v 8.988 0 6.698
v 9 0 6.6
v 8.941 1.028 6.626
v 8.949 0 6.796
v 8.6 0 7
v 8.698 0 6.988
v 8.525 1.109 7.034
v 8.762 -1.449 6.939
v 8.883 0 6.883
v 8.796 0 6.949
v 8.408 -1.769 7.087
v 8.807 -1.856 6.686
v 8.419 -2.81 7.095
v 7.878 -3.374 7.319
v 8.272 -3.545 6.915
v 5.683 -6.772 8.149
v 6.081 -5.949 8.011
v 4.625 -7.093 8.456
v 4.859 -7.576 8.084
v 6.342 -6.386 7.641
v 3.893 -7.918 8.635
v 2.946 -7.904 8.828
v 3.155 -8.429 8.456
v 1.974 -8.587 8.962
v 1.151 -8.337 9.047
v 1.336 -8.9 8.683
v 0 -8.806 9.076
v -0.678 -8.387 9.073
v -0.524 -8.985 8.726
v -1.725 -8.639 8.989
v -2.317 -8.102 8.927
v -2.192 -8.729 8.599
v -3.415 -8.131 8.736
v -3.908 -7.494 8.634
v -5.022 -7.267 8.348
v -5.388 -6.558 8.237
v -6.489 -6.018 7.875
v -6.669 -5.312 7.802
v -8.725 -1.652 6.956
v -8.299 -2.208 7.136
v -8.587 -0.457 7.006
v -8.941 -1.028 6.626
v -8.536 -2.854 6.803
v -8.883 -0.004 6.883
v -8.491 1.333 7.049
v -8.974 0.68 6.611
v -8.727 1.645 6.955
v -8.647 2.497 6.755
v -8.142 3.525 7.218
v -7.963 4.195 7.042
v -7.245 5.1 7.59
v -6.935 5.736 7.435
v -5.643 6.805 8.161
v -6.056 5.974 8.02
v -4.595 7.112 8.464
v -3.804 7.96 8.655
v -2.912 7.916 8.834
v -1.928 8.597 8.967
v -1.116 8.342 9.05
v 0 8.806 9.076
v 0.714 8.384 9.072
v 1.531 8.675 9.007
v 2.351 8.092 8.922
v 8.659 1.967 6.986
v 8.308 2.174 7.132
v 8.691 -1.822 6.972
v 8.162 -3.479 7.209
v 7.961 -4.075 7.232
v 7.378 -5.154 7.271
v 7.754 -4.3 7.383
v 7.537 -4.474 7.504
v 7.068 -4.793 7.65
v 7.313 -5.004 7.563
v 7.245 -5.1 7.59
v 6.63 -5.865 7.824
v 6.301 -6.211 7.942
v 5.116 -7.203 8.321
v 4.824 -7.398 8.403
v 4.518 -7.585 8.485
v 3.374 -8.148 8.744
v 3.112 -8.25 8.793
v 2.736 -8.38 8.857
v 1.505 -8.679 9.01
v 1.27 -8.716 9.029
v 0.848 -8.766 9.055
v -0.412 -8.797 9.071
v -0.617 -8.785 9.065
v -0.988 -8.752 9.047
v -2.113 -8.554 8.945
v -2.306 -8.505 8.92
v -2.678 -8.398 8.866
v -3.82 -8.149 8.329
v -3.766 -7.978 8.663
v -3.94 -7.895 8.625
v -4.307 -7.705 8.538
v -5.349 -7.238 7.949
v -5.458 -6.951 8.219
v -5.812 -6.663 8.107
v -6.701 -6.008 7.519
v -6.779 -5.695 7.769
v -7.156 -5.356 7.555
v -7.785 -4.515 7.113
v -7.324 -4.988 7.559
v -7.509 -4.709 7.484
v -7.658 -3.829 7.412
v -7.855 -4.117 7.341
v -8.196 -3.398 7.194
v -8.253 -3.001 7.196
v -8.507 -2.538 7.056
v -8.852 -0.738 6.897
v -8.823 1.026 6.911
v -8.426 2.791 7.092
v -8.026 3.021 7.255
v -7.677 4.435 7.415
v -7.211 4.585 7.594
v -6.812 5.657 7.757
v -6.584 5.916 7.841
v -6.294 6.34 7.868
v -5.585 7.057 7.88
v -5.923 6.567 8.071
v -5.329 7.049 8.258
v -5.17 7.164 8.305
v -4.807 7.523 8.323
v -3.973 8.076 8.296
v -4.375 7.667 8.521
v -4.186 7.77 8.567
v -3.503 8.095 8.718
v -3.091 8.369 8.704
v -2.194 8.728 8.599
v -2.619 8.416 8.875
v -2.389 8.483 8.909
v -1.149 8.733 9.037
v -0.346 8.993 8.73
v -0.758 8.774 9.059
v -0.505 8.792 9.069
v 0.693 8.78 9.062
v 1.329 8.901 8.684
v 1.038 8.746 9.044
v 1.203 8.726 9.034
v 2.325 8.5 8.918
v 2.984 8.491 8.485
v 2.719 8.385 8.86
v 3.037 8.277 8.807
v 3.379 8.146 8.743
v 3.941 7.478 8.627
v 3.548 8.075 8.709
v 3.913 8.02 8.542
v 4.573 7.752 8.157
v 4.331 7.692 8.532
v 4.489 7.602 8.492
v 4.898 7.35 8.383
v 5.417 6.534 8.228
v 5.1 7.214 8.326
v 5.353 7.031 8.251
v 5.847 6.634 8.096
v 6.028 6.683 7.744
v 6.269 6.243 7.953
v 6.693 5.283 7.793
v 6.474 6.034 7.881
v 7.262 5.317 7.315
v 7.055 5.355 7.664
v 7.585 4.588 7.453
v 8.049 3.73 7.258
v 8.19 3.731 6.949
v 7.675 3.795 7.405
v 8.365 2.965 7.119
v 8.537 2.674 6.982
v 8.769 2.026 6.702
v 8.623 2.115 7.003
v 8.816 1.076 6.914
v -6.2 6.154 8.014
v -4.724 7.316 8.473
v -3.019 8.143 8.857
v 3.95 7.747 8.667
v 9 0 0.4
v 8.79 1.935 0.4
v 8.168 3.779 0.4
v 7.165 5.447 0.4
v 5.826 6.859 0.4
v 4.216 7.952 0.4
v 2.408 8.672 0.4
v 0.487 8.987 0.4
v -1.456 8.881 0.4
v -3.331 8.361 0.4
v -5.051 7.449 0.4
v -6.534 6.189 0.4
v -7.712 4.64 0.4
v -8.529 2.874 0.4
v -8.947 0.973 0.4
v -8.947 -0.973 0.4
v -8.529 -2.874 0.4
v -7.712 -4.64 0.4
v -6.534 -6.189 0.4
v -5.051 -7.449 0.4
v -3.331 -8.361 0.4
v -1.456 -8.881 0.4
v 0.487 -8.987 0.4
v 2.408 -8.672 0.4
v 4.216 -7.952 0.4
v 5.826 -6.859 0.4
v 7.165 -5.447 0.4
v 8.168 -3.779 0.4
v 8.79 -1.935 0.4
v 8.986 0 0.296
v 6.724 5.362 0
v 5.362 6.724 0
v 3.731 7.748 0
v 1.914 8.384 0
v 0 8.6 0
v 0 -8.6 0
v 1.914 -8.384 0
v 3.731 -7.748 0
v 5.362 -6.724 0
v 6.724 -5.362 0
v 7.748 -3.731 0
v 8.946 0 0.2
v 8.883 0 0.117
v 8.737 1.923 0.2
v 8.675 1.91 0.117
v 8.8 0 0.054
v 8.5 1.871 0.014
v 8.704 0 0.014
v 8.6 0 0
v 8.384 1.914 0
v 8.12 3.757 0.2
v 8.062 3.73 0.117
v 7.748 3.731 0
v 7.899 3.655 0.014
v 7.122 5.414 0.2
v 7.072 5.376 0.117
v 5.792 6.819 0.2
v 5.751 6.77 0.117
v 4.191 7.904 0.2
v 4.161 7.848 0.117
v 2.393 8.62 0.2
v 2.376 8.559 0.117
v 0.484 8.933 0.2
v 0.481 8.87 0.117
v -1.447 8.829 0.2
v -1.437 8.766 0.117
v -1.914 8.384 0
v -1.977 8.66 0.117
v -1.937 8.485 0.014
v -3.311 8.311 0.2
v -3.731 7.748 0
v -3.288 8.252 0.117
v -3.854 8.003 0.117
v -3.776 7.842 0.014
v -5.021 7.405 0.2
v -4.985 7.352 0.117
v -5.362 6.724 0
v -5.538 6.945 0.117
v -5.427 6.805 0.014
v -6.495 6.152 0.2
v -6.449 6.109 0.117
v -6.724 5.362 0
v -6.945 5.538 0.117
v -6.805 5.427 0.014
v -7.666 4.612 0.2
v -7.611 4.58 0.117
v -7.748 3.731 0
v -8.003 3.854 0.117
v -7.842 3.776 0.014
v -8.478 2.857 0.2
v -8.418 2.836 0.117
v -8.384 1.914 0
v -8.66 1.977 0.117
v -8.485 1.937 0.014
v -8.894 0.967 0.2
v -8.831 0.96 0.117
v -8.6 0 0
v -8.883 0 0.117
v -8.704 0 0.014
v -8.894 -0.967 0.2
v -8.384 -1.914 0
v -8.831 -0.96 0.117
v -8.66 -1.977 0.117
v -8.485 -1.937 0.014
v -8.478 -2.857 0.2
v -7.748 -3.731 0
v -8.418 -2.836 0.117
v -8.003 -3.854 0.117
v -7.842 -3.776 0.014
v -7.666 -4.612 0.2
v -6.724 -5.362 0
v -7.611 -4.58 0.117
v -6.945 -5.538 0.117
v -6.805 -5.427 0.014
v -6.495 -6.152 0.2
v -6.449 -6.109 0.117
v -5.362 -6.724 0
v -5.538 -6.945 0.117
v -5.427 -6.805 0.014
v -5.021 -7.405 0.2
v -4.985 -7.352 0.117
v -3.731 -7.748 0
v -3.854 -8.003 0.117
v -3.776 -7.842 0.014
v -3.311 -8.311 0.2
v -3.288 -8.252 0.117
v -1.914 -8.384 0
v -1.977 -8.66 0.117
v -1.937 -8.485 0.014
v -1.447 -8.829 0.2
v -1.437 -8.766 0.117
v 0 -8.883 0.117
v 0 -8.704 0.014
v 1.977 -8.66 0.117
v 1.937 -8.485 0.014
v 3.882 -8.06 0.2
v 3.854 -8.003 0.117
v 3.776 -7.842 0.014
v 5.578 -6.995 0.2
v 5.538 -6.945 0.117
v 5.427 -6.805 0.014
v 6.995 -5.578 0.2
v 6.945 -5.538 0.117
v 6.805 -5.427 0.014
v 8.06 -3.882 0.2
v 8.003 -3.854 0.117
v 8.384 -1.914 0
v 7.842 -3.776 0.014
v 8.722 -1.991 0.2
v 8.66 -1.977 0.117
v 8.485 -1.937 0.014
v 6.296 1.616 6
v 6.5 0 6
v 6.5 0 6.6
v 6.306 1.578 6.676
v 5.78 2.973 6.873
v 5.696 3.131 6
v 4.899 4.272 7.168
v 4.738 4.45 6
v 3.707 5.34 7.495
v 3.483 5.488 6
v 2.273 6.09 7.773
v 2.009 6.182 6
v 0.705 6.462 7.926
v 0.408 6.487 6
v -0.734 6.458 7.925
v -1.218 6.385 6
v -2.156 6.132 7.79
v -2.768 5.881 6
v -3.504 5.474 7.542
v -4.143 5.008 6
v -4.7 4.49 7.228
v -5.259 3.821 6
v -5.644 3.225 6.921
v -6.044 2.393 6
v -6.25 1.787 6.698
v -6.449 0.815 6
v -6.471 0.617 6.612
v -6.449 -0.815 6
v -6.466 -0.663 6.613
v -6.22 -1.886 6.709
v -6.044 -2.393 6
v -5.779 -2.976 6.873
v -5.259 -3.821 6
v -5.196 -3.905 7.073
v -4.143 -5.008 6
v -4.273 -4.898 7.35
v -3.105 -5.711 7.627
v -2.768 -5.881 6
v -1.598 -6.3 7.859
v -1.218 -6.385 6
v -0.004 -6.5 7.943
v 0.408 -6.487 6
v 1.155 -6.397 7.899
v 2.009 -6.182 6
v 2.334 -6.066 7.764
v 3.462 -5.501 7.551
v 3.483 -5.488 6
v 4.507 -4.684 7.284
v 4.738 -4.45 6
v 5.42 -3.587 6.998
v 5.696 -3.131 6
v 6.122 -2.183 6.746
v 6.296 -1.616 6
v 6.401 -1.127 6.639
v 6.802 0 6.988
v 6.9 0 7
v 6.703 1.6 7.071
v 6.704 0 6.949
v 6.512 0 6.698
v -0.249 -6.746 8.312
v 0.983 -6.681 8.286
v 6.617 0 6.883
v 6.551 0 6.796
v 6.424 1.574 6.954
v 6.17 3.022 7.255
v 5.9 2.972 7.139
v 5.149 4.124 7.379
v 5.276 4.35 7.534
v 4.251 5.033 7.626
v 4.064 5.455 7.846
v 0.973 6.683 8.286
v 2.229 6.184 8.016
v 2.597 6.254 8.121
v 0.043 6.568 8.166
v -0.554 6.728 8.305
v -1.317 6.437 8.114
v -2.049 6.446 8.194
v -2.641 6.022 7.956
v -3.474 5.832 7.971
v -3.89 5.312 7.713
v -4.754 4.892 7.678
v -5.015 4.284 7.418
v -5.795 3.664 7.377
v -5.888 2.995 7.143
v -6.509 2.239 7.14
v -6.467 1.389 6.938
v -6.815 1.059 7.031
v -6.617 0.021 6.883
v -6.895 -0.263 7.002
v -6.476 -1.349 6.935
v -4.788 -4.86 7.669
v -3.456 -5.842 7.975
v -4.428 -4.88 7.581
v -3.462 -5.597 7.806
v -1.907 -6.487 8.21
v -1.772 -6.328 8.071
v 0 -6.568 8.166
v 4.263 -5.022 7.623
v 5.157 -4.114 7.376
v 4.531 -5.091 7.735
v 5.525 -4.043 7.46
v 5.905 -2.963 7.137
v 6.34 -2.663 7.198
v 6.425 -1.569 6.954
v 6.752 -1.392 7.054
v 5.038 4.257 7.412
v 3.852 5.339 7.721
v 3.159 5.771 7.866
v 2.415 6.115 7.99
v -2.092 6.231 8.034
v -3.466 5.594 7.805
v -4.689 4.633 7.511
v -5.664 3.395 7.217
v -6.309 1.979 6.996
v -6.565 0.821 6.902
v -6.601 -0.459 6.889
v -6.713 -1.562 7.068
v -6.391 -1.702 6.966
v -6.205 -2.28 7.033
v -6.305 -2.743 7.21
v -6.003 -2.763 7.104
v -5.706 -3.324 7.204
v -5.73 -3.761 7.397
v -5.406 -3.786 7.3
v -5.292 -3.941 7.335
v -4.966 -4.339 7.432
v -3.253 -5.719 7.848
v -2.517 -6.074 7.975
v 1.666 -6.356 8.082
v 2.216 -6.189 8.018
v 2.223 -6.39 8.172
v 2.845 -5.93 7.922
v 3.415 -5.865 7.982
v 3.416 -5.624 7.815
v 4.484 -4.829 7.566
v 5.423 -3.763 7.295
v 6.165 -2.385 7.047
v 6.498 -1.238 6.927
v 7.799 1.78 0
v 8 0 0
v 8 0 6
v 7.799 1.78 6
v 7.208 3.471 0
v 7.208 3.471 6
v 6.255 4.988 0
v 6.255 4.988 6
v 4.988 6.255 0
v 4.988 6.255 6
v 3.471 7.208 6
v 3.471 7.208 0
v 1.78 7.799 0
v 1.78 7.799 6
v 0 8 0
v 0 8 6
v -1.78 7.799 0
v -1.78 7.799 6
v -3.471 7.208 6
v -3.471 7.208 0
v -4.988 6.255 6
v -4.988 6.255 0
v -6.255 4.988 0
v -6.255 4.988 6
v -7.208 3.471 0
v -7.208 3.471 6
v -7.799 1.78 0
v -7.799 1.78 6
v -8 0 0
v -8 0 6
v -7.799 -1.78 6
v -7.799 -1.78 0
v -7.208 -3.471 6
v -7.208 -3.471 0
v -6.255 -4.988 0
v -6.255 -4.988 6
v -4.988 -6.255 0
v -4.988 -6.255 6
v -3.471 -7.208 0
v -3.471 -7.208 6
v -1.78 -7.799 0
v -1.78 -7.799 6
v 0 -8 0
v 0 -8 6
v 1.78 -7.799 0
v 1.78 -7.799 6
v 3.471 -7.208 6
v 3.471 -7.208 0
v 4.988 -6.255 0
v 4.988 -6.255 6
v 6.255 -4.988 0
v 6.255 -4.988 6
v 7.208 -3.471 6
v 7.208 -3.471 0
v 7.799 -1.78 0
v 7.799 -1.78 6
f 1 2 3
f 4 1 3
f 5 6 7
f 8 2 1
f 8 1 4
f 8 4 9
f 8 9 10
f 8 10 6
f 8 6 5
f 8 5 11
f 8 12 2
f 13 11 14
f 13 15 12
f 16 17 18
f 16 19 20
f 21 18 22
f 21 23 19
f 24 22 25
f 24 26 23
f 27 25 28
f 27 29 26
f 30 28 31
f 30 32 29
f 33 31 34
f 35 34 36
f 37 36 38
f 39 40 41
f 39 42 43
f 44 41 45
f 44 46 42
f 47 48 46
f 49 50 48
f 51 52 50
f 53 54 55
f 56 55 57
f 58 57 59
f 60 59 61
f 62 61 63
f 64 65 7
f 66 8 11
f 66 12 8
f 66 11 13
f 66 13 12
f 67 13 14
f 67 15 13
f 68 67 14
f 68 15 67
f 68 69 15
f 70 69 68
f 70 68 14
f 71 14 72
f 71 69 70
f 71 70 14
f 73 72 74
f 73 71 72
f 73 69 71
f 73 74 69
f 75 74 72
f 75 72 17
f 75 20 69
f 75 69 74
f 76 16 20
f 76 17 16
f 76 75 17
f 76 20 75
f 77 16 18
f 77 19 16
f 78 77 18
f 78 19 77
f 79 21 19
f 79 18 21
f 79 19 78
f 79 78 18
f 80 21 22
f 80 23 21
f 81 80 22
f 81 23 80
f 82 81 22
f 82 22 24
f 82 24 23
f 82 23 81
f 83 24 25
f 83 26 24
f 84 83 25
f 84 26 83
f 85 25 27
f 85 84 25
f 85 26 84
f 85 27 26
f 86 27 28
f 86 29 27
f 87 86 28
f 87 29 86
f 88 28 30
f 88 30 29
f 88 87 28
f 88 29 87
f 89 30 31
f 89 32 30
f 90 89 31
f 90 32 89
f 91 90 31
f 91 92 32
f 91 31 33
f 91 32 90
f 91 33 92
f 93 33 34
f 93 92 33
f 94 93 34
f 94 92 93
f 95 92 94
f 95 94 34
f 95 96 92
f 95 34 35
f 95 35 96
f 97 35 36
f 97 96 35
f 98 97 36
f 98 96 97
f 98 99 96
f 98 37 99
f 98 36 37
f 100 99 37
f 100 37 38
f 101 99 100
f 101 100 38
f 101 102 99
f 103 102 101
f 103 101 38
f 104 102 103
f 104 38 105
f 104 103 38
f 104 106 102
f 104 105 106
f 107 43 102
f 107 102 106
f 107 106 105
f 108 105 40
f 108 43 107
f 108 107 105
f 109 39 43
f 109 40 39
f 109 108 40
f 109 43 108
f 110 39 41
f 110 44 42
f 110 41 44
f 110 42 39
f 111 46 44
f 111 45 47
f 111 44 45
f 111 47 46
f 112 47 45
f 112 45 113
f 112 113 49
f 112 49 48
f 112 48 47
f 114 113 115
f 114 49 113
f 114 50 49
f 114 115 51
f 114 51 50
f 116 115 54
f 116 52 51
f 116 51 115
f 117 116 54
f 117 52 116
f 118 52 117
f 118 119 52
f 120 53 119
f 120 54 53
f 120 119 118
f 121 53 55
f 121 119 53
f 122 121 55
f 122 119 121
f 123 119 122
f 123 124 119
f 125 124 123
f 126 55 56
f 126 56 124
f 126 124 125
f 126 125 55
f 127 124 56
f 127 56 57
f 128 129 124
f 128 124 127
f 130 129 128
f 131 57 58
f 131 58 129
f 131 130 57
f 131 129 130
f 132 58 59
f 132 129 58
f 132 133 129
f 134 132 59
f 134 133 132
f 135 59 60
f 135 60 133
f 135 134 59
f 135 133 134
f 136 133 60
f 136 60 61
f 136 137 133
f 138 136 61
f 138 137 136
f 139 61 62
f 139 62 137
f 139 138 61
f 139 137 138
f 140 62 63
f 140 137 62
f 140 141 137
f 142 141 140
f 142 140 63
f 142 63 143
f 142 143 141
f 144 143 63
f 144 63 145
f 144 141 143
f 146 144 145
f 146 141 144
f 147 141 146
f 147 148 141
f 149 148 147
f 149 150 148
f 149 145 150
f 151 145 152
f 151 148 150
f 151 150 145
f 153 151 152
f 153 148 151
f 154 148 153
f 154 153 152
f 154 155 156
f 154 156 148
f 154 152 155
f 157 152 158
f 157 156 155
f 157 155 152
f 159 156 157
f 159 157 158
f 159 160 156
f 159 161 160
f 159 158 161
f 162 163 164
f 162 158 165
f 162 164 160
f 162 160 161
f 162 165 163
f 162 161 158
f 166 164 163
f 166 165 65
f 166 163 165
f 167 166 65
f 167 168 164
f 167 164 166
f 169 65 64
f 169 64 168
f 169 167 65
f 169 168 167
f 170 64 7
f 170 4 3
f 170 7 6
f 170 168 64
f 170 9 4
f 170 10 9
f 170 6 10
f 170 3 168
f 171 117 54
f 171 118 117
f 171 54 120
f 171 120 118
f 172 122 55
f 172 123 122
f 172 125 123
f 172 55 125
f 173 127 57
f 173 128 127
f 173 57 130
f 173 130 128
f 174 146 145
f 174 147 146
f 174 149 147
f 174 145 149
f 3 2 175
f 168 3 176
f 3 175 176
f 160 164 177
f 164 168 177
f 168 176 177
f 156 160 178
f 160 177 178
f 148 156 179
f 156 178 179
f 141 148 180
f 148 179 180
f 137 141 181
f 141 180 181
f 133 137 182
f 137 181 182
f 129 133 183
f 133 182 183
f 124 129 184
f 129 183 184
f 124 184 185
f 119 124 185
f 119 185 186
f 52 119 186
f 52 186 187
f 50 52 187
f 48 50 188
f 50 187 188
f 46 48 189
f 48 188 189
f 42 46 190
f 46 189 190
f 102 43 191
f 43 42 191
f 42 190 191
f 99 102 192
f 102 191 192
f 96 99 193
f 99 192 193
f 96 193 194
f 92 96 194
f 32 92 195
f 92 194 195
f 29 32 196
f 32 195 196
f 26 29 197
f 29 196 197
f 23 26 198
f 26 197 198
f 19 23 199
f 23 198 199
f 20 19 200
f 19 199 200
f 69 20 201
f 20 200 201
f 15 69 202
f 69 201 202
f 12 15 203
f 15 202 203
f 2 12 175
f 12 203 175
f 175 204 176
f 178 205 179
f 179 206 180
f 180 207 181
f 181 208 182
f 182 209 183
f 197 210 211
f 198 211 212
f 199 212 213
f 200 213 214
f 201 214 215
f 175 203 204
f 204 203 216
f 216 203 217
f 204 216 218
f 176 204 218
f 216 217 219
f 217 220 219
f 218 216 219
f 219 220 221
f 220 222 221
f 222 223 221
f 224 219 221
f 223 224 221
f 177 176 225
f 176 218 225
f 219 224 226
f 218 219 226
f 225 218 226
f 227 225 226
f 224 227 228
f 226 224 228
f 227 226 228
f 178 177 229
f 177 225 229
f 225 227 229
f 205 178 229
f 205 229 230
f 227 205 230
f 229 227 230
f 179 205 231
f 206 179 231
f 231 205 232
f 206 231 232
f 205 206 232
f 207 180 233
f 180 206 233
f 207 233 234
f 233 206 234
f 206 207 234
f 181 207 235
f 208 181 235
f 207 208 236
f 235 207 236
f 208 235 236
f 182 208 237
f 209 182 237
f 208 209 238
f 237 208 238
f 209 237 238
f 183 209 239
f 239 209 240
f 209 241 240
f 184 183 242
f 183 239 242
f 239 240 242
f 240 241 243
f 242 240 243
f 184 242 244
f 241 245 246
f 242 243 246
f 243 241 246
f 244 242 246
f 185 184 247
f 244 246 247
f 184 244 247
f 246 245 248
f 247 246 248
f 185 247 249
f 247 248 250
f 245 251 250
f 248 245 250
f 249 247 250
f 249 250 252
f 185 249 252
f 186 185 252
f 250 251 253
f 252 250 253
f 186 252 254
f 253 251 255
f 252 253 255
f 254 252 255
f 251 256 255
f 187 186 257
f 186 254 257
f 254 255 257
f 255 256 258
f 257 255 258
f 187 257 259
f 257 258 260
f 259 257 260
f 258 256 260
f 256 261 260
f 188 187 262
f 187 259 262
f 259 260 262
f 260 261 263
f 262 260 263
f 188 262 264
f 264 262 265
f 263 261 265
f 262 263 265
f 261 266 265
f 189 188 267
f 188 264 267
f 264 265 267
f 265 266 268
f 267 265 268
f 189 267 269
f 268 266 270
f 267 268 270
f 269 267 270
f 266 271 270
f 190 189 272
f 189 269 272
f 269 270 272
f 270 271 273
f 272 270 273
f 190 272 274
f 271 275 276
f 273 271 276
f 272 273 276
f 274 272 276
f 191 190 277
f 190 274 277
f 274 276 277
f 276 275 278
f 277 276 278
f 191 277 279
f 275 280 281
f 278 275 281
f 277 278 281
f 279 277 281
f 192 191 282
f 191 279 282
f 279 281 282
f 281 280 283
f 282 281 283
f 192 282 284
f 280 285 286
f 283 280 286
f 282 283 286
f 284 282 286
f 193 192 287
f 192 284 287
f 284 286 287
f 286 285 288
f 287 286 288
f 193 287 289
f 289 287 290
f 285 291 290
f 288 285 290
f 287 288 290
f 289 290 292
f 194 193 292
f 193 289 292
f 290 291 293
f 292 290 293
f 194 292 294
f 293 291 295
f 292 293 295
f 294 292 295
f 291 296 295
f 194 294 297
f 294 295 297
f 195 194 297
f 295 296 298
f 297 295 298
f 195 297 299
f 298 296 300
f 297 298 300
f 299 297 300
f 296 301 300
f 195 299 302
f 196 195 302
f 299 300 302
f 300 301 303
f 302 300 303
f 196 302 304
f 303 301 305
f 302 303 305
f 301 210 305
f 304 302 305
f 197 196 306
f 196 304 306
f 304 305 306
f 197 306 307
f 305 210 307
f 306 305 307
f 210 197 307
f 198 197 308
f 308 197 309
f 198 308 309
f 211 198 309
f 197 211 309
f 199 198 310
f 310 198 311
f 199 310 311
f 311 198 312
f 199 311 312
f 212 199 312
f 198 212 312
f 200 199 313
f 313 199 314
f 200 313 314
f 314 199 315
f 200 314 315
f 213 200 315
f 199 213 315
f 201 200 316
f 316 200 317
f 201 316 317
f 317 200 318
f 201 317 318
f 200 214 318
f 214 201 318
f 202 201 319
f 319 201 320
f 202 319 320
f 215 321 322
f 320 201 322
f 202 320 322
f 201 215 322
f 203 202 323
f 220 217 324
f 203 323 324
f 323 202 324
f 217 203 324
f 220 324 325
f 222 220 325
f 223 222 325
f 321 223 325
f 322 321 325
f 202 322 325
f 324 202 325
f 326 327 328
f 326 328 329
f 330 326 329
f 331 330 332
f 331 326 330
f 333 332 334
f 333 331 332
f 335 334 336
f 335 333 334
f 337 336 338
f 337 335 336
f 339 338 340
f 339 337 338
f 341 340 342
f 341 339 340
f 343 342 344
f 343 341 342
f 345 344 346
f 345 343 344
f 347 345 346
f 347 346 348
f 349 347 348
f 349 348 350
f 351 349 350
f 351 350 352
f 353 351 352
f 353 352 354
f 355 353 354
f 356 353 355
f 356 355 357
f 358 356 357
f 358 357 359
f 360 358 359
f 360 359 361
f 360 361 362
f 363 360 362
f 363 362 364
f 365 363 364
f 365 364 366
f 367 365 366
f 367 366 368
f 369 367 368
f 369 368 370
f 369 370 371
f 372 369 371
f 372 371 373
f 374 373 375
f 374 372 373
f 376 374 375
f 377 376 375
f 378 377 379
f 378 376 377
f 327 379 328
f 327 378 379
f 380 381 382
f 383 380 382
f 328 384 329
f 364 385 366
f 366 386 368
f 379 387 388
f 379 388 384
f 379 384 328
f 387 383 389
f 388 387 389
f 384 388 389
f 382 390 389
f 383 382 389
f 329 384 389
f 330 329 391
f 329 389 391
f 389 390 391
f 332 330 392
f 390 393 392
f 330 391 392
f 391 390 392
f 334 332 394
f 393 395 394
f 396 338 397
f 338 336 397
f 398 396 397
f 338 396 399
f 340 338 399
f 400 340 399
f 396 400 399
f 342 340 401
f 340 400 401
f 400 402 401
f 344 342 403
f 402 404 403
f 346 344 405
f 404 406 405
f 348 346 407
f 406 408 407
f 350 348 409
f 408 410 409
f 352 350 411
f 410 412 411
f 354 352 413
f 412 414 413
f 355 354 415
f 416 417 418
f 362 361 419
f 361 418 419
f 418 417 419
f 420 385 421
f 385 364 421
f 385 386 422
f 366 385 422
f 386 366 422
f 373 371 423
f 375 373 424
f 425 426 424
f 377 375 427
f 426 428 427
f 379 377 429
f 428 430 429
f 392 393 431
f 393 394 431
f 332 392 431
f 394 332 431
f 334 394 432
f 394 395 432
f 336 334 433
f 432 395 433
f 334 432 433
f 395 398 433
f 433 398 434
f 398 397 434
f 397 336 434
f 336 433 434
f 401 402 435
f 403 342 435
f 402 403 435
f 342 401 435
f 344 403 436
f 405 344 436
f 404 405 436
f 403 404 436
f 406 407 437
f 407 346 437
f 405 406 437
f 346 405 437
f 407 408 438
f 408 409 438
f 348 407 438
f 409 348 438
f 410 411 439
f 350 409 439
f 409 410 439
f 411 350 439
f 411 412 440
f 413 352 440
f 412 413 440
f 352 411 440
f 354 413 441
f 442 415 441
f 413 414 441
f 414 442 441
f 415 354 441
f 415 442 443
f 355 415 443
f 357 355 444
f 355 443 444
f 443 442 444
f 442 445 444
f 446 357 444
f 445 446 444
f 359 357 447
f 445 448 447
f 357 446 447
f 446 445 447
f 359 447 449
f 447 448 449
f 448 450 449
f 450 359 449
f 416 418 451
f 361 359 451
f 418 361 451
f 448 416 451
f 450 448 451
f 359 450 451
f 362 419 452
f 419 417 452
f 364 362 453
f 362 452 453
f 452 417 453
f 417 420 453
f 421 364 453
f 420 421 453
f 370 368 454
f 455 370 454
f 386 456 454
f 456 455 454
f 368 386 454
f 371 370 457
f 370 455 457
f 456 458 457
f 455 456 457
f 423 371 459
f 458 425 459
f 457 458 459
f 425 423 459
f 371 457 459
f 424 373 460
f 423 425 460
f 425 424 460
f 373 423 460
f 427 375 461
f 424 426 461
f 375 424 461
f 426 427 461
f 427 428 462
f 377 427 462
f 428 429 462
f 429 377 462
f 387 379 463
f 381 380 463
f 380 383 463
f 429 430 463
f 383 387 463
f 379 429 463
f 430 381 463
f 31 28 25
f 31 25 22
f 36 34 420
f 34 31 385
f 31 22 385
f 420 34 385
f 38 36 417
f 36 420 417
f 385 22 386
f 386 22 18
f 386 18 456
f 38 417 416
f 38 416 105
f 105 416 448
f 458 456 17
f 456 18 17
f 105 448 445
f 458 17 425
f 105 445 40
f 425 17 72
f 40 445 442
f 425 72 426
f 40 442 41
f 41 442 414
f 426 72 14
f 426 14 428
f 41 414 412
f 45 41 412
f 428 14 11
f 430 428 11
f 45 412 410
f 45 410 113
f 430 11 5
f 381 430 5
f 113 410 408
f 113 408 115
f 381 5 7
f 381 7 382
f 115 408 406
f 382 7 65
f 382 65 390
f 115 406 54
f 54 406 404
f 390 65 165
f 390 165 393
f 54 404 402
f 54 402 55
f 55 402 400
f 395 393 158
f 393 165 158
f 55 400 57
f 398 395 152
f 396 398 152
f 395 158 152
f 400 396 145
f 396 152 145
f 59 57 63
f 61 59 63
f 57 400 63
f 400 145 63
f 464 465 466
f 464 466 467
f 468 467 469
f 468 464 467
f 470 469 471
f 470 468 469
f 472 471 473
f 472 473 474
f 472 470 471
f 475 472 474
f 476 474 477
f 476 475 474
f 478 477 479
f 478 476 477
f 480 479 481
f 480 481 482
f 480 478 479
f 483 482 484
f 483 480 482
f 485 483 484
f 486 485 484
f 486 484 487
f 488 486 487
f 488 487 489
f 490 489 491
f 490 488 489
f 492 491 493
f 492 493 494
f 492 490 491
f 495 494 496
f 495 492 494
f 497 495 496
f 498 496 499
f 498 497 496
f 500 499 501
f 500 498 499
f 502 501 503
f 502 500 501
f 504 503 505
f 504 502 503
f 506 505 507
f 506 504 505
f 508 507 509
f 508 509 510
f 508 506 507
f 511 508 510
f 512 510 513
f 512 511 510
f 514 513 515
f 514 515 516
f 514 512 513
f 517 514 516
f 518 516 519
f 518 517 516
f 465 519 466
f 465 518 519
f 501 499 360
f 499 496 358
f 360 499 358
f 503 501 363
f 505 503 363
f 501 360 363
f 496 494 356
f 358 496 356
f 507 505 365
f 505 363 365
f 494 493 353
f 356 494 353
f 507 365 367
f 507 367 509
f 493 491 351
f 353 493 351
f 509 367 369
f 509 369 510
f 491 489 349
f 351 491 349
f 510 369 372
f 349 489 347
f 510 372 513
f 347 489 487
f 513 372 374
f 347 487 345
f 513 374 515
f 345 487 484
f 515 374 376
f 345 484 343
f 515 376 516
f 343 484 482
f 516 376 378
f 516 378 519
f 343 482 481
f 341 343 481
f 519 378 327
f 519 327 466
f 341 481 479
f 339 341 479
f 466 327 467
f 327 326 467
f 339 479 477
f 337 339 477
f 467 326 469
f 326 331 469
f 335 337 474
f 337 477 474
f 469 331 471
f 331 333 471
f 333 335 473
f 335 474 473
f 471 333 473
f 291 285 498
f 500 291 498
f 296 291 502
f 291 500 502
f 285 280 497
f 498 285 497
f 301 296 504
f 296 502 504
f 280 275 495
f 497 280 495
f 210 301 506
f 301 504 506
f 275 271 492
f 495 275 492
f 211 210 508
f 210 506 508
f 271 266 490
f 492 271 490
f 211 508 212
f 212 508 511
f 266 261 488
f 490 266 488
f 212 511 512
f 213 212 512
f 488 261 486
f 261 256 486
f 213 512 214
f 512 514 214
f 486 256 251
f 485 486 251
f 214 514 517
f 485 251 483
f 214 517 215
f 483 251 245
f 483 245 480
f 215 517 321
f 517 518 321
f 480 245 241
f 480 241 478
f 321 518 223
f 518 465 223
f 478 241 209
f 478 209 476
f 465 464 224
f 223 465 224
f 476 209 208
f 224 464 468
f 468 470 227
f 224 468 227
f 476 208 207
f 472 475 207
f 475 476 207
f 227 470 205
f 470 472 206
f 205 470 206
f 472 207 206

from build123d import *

# Parameters (mm, degrees)
SKETCH_R        = 9
SKETCH_R_2      = 6.5
PAD_DEPTH       = 10
SKETCH001_R     = 18
POCKET_DEPTH    = 9
SKETCH002_R     = 8
POCKET001_DEPTH = 6
FILLET_R        = 0.4
FILLET001_R     = 0.4


with BuildPart() as part:
    # Sketch → Pad (new body)
    with BuildSketch(Plane.XY):
        Circle(SKETCH_R)
        Circle(SKETCH_R_2, mode=Mode.SUBTRACT)
    extrude(amount=PAD_DEPTH)

    # Sketch001 → Pocket (cut, symmetric)
    with BuildSketch(Plane.YZ):
        with Locations((0, 25)):
            Circle(SKETCH001_R)
    extrude(amount=POCKET_DEPTH, both=True, mode=Mode.SUBTRACT)

    # Sketch002 → Pocket001 (cut)
    with BuildSketch(Plane.XY):
        Circle(SKETCH002_R)
    extrude(amount=POCKET001_DEPTH, mode=Mode.SUBTRACT)

    # Fillet
    fillet_edges = [part.edges().sort_by_distance(p)[0] for p in [
        (0, 9, 9.411543),
        (-6.5, 0, 7),
        (0, -9, 9.411543),
    ]]
    fillet(fillet_edges, radius=FILLET_R)

    # Fillet001
    fillet001_edges = [part.edges().sort_by_distance(p)[0] for p in [
        (-9, 0, 0),
    ]]
    fillet(fillet001_edges, radius=FILLET001_R)


solid = part.part
